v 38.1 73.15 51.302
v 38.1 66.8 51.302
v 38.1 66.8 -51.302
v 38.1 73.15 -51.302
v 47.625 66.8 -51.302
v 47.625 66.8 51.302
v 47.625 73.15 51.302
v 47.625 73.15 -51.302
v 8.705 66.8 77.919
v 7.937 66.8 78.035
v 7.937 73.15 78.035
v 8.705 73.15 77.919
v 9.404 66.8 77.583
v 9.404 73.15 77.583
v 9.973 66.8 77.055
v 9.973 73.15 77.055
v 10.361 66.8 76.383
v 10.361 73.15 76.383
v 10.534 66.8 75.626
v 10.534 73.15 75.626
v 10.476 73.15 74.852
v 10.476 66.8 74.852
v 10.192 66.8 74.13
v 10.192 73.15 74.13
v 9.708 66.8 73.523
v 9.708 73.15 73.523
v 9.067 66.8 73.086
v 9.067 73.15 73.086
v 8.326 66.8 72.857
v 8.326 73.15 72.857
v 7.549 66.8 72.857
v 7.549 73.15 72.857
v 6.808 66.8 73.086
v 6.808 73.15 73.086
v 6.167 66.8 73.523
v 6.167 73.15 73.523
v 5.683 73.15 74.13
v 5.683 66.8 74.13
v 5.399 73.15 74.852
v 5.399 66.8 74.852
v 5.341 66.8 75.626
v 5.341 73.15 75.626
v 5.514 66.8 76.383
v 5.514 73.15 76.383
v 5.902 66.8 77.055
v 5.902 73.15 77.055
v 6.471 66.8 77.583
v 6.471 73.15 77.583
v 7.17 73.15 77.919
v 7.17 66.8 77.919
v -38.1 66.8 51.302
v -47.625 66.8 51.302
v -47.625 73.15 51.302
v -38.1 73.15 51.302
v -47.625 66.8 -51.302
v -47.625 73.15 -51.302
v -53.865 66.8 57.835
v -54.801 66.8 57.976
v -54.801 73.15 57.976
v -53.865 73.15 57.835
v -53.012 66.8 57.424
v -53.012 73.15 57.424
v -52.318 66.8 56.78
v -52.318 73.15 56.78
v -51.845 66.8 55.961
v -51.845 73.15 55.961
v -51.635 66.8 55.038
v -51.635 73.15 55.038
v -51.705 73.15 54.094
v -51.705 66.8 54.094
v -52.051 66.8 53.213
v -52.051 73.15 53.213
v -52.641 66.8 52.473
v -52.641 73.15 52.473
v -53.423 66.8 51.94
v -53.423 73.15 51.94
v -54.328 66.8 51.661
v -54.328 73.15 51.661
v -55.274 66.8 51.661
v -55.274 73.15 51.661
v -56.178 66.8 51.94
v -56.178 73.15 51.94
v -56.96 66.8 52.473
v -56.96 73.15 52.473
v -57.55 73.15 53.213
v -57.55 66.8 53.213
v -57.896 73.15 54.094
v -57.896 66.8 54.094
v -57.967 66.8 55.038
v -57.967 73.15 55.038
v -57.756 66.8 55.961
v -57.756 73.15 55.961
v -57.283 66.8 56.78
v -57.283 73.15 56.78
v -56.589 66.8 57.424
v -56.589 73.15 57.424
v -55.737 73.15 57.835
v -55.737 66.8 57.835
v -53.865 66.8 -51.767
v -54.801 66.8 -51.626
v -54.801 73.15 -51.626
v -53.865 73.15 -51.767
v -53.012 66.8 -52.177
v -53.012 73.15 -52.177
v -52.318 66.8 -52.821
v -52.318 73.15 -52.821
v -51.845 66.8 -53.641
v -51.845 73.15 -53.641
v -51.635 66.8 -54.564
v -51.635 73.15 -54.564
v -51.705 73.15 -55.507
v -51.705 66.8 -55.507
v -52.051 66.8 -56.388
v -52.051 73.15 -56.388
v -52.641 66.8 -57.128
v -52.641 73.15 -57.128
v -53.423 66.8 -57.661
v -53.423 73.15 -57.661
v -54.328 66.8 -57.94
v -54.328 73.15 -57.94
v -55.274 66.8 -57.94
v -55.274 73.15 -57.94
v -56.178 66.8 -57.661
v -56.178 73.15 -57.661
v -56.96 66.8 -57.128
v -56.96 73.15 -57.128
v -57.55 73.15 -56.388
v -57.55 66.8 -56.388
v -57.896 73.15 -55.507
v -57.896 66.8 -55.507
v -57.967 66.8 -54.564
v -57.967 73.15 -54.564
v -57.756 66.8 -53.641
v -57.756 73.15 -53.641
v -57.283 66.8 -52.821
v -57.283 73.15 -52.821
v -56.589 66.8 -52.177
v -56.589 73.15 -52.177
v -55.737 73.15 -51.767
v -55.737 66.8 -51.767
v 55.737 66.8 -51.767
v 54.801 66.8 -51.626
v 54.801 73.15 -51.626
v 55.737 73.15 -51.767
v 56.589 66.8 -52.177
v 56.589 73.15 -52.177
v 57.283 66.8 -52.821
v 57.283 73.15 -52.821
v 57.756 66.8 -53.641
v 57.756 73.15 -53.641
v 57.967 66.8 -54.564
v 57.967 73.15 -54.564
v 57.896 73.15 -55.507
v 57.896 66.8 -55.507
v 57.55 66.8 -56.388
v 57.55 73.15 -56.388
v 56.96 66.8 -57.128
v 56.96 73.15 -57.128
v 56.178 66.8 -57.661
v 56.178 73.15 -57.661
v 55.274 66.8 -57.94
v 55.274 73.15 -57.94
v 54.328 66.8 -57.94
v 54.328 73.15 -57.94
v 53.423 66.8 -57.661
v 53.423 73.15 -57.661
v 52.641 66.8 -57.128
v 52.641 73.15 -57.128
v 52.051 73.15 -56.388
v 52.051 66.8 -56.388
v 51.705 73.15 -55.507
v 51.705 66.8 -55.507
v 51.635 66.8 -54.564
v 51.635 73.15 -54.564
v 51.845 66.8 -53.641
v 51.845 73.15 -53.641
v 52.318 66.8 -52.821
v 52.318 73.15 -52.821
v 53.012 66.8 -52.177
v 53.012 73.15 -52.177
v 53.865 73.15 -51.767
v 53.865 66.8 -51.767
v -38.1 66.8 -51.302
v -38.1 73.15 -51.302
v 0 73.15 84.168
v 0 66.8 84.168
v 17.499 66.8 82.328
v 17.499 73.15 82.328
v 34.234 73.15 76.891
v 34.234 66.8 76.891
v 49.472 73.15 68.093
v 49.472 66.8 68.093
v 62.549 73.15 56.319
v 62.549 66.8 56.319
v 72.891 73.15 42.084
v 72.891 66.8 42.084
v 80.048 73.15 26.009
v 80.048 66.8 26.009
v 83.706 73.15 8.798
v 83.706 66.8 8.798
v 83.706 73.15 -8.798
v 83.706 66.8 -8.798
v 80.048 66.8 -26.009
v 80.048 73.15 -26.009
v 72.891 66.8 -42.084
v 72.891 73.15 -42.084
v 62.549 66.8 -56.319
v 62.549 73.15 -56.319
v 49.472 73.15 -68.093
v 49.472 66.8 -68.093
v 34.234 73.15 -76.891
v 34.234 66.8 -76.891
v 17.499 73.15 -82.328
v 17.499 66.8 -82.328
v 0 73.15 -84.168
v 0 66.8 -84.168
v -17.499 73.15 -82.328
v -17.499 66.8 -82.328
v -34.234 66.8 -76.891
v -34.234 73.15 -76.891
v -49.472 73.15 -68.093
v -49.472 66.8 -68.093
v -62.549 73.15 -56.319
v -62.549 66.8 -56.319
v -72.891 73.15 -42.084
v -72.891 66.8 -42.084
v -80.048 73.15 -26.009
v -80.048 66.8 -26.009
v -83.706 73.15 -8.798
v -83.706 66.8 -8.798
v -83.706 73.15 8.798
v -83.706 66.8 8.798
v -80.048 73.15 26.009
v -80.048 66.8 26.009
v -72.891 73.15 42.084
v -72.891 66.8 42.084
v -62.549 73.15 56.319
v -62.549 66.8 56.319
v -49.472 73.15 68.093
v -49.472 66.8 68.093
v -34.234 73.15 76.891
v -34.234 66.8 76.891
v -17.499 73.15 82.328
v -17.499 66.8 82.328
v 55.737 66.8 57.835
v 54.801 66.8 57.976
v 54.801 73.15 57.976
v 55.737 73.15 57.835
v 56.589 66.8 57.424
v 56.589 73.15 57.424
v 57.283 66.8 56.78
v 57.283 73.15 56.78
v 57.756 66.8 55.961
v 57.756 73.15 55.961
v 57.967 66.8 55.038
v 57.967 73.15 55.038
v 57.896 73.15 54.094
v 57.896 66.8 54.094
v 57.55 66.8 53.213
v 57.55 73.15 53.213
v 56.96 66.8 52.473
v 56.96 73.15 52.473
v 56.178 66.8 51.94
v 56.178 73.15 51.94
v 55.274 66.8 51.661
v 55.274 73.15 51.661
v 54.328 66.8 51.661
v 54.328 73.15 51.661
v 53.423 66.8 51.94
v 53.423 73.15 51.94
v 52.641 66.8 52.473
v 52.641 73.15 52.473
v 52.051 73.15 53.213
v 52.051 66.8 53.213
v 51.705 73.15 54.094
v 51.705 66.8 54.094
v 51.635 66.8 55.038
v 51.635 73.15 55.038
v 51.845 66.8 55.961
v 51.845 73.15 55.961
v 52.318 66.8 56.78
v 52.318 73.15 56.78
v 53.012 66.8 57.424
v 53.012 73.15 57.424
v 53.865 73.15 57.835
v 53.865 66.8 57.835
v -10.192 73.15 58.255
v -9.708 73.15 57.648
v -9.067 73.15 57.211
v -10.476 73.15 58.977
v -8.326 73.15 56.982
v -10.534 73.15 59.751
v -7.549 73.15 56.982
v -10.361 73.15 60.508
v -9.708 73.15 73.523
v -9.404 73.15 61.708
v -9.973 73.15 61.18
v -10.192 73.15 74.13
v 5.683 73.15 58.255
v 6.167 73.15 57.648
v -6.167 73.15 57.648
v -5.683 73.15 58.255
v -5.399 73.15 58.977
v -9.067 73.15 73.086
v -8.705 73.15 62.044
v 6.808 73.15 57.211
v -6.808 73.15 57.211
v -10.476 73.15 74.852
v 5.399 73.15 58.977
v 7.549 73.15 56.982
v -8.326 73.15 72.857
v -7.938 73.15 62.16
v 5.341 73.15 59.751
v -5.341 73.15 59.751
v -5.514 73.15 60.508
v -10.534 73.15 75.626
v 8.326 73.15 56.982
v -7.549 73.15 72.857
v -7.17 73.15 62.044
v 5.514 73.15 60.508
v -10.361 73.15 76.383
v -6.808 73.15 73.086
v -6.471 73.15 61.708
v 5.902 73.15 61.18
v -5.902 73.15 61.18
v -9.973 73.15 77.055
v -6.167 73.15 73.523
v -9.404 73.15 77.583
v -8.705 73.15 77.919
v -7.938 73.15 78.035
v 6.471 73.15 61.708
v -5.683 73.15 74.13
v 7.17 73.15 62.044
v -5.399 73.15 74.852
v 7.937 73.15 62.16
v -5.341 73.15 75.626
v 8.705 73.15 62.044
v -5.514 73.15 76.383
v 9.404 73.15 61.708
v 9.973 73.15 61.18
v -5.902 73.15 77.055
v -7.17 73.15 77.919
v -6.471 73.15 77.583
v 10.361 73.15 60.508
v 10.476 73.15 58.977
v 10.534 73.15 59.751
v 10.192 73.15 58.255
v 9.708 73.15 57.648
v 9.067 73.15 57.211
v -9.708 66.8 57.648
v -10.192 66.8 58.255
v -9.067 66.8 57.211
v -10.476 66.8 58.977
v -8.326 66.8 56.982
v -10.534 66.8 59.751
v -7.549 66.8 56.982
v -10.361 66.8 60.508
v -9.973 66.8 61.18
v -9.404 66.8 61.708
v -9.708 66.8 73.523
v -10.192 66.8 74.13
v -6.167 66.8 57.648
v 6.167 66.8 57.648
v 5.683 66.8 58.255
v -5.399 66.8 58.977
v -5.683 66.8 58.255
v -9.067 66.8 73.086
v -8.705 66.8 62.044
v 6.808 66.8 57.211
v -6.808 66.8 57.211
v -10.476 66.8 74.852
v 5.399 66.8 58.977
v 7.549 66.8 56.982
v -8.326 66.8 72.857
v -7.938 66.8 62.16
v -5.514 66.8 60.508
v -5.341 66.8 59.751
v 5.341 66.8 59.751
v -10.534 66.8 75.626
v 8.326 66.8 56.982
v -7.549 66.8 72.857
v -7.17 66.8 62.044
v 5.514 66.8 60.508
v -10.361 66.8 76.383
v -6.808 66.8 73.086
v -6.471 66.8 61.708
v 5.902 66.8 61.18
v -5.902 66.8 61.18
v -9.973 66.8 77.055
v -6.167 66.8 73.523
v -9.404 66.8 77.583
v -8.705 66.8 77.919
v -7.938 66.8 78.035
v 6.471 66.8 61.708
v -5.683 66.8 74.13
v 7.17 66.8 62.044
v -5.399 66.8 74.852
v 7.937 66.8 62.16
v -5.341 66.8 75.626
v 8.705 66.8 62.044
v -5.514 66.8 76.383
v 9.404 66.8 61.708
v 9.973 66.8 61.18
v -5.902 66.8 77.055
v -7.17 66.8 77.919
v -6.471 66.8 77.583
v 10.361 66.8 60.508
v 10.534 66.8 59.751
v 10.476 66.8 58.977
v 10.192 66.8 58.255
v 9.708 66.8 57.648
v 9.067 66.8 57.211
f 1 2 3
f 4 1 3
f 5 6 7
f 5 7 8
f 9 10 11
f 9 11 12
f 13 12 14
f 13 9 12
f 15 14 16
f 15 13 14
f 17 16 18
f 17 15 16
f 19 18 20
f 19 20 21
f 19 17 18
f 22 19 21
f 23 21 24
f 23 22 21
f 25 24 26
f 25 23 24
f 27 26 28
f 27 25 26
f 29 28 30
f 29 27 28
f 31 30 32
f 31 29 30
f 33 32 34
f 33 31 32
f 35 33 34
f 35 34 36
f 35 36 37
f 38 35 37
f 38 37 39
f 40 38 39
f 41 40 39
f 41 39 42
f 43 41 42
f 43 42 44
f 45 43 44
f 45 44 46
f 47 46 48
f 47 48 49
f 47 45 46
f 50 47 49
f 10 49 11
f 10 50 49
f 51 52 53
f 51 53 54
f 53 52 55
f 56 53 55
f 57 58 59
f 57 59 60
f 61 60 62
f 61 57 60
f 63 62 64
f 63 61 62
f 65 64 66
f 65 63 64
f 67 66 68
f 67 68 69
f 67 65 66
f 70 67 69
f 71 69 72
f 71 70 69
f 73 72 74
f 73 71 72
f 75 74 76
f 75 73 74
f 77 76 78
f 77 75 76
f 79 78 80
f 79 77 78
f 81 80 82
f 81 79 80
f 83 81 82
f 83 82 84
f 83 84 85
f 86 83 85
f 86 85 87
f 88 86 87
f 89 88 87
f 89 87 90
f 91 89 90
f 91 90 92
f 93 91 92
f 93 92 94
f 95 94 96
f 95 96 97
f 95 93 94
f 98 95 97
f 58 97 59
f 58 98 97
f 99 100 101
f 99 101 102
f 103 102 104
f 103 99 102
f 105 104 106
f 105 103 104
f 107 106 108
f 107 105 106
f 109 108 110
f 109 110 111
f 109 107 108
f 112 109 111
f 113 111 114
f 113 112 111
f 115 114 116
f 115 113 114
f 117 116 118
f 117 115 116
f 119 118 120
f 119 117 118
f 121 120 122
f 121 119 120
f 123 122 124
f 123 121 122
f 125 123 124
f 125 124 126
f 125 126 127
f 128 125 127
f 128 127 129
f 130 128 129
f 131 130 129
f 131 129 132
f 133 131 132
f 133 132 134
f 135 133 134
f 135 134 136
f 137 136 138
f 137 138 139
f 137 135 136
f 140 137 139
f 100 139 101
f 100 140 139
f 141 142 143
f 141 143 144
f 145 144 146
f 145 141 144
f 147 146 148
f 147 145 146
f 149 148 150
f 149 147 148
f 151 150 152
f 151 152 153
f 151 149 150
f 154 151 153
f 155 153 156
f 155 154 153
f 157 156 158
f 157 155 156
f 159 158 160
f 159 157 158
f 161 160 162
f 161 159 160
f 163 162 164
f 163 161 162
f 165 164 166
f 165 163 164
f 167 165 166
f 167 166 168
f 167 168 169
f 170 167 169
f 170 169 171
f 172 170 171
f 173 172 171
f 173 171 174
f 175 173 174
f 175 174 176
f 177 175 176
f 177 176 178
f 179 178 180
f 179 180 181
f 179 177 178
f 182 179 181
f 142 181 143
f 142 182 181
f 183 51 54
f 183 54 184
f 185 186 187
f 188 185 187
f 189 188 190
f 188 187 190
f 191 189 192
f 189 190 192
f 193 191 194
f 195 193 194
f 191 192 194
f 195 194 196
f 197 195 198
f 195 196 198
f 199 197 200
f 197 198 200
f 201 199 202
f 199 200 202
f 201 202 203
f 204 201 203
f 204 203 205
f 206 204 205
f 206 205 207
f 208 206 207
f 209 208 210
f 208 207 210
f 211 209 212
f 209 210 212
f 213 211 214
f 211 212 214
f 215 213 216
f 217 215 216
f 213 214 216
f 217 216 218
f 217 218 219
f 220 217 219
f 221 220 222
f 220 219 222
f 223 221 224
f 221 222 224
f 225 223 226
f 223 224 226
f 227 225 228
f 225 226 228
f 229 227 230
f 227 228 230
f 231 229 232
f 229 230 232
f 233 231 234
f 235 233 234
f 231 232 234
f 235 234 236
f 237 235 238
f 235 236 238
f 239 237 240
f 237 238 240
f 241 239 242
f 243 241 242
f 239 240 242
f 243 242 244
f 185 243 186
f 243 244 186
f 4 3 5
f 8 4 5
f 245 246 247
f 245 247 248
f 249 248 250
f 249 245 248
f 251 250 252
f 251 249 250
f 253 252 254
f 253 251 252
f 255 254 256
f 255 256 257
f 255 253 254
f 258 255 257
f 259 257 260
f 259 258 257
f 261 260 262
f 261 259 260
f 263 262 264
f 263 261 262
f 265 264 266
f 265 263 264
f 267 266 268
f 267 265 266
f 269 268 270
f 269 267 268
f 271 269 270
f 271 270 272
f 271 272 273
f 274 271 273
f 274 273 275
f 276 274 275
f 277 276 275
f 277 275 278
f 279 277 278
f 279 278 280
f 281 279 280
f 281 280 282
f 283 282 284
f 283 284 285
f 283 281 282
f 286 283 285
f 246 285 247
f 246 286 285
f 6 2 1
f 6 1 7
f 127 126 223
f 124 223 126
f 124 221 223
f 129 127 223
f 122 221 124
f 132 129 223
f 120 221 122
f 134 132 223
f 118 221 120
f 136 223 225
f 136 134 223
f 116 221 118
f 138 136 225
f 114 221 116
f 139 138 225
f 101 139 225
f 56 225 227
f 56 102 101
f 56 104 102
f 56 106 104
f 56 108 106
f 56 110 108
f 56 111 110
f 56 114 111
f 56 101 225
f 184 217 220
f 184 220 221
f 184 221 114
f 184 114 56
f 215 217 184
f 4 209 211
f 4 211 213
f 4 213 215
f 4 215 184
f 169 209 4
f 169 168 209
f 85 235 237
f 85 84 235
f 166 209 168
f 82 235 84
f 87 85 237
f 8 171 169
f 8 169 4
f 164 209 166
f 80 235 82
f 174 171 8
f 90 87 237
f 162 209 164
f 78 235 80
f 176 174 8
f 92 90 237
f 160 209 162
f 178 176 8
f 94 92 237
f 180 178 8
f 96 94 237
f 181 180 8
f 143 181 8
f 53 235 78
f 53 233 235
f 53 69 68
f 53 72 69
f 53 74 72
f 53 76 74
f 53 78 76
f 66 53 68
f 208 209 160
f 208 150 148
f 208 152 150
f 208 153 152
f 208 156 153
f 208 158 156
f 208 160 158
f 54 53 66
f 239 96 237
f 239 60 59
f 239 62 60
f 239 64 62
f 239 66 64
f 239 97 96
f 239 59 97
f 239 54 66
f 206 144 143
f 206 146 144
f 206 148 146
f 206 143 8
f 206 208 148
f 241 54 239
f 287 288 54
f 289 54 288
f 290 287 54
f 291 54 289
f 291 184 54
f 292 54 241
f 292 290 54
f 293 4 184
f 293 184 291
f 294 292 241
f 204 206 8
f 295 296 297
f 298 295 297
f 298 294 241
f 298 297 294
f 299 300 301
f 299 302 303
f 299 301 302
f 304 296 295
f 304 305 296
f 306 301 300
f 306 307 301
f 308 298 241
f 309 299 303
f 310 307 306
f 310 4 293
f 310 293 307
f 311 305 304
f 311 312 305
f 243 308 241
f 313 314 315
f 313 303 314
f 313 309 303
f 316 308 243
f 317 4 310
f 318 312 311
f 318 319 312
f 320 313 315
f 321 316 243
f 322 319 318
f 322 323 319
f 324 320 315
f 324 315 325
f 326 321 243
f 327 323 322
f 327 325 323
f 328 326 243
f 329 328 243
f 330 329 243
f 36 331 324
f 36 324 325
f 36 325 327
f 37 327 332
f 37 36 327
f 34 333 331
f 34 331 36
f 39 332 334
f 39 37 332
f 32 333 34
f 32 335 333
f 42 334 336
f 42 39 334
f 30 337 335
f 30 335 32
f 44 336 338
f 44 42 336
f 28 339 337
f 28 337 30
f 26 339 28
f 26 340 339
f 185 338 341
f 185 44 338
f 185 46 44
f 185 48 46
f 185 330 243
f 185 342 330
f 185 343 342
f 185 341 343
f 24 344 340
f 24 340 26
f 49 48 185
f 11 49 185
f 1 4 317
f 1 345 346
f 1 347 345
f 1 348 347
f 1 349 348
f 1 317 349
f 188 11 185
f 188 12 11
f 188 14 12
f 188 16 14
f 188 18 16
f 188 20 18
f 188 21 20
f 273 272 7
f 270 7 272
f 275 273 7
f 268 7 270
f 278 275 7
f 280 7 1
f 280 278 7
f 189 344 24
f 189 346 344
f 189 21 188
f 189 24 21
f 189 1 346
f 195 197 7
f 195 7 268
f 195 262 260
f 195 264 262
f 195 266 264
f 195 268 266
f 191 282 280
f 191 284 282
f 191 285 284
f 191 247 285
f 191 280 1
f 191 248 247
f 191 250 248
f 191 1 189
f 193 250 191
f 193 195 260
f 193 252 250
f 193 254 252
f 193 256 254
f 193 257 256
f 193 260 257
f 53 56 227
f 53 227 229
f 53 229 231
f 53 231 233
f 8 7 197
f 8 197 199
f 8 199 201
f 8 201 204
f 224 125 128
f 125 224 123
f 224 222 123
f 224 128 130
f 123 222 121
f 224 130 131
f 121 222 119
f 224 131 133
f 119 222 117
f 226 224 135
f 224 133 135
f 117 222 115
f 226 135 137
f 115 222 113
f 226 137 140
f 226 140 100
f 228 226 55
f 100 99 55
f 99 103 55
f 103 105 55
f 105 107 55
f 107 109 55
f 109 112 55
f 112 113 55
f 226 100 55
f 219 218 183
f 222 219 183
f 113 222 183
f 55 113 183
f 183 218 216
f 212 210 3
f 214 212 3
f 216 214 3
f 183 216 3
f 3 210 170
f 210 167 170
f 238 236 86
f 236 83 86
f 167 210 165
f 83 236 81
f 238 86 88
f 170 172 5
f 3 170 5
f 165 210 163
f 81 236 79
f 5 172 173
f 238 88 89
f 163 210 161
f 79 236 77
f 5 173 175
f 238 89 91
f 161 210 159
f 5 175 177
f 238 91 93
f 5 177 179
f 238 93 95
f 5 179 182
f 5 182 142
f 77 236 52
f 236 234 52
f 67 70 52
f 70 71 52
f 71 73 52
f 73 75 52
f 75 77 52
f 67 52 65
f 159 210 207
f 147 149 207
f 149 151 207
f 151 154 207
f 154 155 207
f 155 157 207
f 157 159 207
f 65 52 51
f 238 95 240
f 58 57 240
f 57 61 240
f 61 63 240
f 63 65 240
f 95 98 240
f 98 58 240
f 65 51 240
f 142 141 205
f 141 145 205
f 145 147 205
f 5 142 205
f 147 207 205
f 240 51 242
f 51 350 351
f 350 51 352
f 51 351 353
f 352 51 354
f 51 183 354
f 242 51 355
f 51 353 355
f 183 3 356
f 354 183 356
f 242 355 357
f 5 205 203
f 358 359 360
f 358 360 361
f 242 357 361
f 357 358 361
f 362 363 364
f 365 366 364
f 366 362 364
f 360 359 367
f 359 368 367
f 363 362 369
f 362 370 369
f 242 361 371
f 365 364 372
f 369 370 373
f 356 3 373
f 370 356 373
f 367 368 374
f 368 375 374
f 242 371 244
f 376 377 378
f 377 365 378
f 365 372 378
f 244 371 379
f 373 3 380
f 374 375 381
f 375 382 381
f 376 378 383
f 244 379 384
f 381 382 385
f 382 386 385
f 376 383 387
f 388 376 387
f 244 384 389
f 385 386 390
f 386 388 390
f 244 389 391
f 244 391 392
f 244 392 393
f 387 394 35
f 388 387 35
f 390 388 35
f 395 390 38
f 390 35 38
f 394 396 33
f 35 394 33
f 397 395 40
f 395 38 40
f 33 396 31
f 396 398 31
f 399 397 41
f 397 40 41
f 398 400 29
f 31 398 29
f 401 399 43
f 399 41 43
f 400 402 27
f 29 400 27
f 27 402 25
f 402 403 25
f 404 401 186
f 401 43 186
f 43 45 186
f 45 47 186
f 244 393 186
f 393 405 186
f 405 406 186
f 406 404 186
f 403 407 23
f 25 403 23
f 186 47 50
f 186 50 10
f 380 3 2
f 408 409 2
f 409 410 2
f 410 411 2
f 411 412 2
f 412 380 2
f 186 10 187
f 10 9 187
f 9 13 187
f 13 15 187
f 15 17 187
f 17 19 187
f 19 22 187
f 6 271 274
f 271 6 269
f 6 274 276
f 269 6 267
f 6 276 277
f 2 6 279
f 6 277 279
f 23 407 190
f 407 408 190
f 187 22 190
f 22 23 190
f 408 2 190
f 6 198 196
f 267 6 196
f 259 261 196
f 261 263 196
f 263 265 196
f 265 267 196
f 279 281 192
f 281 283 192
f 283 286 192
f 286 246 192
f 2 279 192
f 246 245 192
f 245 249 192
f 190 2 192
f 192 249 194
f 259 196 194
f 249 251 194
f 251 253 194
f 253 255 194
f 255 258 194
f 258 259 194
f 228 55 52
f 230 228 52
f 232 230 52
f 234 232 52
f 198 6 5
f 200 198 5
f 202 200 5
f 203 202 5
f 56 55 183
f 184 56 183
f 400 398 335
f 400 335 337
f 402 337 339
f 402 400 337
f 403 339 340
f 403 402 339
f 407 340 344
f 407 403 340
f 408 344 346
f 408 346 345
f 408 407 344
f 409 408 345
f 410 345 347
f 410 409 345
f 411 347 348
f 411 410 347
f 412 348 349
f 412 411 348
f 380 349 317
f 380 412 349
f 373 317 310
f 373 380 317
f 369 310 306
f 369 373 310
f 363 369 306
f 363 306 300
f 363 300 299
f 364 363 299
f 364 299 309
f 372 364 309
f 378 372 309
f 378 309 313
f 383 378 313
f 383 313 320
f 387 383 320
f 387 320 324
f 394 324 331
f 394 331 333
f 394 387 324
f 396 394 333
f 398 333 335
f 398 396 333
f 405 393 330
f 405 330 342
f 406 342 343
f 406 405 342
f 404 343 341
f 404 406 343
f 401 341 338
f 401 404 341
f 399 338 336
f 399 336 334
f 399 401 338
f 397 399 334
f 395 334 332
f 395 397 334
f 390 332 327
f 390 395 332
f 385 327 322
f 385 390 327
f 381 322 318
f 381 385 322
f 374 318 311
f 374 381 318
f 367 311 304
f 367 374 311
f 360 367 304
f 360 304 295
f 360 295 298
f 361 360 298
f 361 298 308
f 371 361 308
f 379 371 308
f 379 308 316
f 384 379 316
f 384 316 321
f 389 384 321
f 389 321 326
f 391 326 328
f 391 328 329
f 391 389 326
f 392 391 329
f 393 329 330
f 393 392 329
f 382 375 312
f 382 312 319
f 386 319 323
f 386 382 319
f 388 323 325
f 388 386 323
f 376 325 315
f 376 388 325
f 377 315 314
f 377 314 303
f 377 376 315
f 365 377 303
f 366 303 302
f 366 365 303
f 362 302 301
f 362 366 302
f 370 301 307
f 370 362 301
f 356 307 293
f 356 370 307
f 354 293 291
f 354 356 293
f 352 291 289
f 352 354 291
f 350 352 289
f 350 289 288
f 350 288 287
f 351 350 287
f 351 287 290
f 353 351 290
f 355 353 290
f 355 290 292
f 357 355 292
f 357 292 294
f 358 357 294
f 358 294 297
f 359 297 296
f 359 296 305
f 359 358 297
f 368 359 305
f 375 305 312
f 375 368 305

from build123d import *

# Parameters (mm, degrees)
SKETCH1_R           = 84.1675
SKETCH1_W           = 9.525
SKETCH1_H           = 102.603301604
SKETCH1_R_2         = 2.6035
SKETCH1_R_3         = 3.175
BOSS_EXTRUDE1_DEPTH = 6.35


with BuildPart() as part:
    # Sketch1 → Boss-Extrude1 (new body)
    with BuildSketch(Plane(origin=(0, 66.8, 0), x_dir=(1, 0, 0), z_dir=(0, 1, 0))):
        with Locations(Location((0, 0, 0), (0, 0, 270))):
            Circle(SKETCH1_R)
        with Locations((-42.8625, 0)):
            Rectangle(SKETCH1_W, SKETCH1_H, mode=Mode.SUBTRACT)
        with Locations((42.8625, 0)):
            Rectangle(SKETCH1_W, SKETCH1_H, mode=Mode.SUBTRACT)
        with Locations(Location((-7.9375, -59.556650802, 0), (0, 0, 270))):
            Circle(SKETCH1_R_2, mode=Mode.SUBTRACT)
        with Locations(Location((7.9375, -59.556650802, 0), (0, 0, 270))):
            Circle(SKETCH1_R_2, mode=Mode.SUBTRACT)
        with Locations(Location((-54.800775542, -54.800775542, 0), (0, 0, 270))):
            Circle(SKETCH1_R_3, mode=Mode.SUBTRACT)
        with Locations(Location((-7.9375, -75.431650802, 0), (0, 0, 270))):
            Circle(SKETCH1_R_2, mode=Mode.SUBTRACT)
        with Locations(Location((7.9375, -75.431650802, 0), (0, 0, 270))):
            Circle(SKETCH1_R_2, mode=Mode.SUBTRACT)
        with Locations(Location((54.800775542, -54.800775542, 0), (0, 0, 270))):
            Circle(SKETCH1_R_3, mode=Mode.SUBTRACT)
        with Locations(Location((-54.800775542, 54.800775542, 0), (0, 0, 270))):
            Circle(SKETCH1_R_3, mode=Mode.SUBTRACT)
        with Locations(Location((54.800775542, 54.800775542, 0), (0, 0, 270))):
            Circle(SKETCH1_R_3, mode=Mode.SUBTRACT)
    extrude(amount=BOSS_EXTRUDE1_DEPTH)


solid = part.part
